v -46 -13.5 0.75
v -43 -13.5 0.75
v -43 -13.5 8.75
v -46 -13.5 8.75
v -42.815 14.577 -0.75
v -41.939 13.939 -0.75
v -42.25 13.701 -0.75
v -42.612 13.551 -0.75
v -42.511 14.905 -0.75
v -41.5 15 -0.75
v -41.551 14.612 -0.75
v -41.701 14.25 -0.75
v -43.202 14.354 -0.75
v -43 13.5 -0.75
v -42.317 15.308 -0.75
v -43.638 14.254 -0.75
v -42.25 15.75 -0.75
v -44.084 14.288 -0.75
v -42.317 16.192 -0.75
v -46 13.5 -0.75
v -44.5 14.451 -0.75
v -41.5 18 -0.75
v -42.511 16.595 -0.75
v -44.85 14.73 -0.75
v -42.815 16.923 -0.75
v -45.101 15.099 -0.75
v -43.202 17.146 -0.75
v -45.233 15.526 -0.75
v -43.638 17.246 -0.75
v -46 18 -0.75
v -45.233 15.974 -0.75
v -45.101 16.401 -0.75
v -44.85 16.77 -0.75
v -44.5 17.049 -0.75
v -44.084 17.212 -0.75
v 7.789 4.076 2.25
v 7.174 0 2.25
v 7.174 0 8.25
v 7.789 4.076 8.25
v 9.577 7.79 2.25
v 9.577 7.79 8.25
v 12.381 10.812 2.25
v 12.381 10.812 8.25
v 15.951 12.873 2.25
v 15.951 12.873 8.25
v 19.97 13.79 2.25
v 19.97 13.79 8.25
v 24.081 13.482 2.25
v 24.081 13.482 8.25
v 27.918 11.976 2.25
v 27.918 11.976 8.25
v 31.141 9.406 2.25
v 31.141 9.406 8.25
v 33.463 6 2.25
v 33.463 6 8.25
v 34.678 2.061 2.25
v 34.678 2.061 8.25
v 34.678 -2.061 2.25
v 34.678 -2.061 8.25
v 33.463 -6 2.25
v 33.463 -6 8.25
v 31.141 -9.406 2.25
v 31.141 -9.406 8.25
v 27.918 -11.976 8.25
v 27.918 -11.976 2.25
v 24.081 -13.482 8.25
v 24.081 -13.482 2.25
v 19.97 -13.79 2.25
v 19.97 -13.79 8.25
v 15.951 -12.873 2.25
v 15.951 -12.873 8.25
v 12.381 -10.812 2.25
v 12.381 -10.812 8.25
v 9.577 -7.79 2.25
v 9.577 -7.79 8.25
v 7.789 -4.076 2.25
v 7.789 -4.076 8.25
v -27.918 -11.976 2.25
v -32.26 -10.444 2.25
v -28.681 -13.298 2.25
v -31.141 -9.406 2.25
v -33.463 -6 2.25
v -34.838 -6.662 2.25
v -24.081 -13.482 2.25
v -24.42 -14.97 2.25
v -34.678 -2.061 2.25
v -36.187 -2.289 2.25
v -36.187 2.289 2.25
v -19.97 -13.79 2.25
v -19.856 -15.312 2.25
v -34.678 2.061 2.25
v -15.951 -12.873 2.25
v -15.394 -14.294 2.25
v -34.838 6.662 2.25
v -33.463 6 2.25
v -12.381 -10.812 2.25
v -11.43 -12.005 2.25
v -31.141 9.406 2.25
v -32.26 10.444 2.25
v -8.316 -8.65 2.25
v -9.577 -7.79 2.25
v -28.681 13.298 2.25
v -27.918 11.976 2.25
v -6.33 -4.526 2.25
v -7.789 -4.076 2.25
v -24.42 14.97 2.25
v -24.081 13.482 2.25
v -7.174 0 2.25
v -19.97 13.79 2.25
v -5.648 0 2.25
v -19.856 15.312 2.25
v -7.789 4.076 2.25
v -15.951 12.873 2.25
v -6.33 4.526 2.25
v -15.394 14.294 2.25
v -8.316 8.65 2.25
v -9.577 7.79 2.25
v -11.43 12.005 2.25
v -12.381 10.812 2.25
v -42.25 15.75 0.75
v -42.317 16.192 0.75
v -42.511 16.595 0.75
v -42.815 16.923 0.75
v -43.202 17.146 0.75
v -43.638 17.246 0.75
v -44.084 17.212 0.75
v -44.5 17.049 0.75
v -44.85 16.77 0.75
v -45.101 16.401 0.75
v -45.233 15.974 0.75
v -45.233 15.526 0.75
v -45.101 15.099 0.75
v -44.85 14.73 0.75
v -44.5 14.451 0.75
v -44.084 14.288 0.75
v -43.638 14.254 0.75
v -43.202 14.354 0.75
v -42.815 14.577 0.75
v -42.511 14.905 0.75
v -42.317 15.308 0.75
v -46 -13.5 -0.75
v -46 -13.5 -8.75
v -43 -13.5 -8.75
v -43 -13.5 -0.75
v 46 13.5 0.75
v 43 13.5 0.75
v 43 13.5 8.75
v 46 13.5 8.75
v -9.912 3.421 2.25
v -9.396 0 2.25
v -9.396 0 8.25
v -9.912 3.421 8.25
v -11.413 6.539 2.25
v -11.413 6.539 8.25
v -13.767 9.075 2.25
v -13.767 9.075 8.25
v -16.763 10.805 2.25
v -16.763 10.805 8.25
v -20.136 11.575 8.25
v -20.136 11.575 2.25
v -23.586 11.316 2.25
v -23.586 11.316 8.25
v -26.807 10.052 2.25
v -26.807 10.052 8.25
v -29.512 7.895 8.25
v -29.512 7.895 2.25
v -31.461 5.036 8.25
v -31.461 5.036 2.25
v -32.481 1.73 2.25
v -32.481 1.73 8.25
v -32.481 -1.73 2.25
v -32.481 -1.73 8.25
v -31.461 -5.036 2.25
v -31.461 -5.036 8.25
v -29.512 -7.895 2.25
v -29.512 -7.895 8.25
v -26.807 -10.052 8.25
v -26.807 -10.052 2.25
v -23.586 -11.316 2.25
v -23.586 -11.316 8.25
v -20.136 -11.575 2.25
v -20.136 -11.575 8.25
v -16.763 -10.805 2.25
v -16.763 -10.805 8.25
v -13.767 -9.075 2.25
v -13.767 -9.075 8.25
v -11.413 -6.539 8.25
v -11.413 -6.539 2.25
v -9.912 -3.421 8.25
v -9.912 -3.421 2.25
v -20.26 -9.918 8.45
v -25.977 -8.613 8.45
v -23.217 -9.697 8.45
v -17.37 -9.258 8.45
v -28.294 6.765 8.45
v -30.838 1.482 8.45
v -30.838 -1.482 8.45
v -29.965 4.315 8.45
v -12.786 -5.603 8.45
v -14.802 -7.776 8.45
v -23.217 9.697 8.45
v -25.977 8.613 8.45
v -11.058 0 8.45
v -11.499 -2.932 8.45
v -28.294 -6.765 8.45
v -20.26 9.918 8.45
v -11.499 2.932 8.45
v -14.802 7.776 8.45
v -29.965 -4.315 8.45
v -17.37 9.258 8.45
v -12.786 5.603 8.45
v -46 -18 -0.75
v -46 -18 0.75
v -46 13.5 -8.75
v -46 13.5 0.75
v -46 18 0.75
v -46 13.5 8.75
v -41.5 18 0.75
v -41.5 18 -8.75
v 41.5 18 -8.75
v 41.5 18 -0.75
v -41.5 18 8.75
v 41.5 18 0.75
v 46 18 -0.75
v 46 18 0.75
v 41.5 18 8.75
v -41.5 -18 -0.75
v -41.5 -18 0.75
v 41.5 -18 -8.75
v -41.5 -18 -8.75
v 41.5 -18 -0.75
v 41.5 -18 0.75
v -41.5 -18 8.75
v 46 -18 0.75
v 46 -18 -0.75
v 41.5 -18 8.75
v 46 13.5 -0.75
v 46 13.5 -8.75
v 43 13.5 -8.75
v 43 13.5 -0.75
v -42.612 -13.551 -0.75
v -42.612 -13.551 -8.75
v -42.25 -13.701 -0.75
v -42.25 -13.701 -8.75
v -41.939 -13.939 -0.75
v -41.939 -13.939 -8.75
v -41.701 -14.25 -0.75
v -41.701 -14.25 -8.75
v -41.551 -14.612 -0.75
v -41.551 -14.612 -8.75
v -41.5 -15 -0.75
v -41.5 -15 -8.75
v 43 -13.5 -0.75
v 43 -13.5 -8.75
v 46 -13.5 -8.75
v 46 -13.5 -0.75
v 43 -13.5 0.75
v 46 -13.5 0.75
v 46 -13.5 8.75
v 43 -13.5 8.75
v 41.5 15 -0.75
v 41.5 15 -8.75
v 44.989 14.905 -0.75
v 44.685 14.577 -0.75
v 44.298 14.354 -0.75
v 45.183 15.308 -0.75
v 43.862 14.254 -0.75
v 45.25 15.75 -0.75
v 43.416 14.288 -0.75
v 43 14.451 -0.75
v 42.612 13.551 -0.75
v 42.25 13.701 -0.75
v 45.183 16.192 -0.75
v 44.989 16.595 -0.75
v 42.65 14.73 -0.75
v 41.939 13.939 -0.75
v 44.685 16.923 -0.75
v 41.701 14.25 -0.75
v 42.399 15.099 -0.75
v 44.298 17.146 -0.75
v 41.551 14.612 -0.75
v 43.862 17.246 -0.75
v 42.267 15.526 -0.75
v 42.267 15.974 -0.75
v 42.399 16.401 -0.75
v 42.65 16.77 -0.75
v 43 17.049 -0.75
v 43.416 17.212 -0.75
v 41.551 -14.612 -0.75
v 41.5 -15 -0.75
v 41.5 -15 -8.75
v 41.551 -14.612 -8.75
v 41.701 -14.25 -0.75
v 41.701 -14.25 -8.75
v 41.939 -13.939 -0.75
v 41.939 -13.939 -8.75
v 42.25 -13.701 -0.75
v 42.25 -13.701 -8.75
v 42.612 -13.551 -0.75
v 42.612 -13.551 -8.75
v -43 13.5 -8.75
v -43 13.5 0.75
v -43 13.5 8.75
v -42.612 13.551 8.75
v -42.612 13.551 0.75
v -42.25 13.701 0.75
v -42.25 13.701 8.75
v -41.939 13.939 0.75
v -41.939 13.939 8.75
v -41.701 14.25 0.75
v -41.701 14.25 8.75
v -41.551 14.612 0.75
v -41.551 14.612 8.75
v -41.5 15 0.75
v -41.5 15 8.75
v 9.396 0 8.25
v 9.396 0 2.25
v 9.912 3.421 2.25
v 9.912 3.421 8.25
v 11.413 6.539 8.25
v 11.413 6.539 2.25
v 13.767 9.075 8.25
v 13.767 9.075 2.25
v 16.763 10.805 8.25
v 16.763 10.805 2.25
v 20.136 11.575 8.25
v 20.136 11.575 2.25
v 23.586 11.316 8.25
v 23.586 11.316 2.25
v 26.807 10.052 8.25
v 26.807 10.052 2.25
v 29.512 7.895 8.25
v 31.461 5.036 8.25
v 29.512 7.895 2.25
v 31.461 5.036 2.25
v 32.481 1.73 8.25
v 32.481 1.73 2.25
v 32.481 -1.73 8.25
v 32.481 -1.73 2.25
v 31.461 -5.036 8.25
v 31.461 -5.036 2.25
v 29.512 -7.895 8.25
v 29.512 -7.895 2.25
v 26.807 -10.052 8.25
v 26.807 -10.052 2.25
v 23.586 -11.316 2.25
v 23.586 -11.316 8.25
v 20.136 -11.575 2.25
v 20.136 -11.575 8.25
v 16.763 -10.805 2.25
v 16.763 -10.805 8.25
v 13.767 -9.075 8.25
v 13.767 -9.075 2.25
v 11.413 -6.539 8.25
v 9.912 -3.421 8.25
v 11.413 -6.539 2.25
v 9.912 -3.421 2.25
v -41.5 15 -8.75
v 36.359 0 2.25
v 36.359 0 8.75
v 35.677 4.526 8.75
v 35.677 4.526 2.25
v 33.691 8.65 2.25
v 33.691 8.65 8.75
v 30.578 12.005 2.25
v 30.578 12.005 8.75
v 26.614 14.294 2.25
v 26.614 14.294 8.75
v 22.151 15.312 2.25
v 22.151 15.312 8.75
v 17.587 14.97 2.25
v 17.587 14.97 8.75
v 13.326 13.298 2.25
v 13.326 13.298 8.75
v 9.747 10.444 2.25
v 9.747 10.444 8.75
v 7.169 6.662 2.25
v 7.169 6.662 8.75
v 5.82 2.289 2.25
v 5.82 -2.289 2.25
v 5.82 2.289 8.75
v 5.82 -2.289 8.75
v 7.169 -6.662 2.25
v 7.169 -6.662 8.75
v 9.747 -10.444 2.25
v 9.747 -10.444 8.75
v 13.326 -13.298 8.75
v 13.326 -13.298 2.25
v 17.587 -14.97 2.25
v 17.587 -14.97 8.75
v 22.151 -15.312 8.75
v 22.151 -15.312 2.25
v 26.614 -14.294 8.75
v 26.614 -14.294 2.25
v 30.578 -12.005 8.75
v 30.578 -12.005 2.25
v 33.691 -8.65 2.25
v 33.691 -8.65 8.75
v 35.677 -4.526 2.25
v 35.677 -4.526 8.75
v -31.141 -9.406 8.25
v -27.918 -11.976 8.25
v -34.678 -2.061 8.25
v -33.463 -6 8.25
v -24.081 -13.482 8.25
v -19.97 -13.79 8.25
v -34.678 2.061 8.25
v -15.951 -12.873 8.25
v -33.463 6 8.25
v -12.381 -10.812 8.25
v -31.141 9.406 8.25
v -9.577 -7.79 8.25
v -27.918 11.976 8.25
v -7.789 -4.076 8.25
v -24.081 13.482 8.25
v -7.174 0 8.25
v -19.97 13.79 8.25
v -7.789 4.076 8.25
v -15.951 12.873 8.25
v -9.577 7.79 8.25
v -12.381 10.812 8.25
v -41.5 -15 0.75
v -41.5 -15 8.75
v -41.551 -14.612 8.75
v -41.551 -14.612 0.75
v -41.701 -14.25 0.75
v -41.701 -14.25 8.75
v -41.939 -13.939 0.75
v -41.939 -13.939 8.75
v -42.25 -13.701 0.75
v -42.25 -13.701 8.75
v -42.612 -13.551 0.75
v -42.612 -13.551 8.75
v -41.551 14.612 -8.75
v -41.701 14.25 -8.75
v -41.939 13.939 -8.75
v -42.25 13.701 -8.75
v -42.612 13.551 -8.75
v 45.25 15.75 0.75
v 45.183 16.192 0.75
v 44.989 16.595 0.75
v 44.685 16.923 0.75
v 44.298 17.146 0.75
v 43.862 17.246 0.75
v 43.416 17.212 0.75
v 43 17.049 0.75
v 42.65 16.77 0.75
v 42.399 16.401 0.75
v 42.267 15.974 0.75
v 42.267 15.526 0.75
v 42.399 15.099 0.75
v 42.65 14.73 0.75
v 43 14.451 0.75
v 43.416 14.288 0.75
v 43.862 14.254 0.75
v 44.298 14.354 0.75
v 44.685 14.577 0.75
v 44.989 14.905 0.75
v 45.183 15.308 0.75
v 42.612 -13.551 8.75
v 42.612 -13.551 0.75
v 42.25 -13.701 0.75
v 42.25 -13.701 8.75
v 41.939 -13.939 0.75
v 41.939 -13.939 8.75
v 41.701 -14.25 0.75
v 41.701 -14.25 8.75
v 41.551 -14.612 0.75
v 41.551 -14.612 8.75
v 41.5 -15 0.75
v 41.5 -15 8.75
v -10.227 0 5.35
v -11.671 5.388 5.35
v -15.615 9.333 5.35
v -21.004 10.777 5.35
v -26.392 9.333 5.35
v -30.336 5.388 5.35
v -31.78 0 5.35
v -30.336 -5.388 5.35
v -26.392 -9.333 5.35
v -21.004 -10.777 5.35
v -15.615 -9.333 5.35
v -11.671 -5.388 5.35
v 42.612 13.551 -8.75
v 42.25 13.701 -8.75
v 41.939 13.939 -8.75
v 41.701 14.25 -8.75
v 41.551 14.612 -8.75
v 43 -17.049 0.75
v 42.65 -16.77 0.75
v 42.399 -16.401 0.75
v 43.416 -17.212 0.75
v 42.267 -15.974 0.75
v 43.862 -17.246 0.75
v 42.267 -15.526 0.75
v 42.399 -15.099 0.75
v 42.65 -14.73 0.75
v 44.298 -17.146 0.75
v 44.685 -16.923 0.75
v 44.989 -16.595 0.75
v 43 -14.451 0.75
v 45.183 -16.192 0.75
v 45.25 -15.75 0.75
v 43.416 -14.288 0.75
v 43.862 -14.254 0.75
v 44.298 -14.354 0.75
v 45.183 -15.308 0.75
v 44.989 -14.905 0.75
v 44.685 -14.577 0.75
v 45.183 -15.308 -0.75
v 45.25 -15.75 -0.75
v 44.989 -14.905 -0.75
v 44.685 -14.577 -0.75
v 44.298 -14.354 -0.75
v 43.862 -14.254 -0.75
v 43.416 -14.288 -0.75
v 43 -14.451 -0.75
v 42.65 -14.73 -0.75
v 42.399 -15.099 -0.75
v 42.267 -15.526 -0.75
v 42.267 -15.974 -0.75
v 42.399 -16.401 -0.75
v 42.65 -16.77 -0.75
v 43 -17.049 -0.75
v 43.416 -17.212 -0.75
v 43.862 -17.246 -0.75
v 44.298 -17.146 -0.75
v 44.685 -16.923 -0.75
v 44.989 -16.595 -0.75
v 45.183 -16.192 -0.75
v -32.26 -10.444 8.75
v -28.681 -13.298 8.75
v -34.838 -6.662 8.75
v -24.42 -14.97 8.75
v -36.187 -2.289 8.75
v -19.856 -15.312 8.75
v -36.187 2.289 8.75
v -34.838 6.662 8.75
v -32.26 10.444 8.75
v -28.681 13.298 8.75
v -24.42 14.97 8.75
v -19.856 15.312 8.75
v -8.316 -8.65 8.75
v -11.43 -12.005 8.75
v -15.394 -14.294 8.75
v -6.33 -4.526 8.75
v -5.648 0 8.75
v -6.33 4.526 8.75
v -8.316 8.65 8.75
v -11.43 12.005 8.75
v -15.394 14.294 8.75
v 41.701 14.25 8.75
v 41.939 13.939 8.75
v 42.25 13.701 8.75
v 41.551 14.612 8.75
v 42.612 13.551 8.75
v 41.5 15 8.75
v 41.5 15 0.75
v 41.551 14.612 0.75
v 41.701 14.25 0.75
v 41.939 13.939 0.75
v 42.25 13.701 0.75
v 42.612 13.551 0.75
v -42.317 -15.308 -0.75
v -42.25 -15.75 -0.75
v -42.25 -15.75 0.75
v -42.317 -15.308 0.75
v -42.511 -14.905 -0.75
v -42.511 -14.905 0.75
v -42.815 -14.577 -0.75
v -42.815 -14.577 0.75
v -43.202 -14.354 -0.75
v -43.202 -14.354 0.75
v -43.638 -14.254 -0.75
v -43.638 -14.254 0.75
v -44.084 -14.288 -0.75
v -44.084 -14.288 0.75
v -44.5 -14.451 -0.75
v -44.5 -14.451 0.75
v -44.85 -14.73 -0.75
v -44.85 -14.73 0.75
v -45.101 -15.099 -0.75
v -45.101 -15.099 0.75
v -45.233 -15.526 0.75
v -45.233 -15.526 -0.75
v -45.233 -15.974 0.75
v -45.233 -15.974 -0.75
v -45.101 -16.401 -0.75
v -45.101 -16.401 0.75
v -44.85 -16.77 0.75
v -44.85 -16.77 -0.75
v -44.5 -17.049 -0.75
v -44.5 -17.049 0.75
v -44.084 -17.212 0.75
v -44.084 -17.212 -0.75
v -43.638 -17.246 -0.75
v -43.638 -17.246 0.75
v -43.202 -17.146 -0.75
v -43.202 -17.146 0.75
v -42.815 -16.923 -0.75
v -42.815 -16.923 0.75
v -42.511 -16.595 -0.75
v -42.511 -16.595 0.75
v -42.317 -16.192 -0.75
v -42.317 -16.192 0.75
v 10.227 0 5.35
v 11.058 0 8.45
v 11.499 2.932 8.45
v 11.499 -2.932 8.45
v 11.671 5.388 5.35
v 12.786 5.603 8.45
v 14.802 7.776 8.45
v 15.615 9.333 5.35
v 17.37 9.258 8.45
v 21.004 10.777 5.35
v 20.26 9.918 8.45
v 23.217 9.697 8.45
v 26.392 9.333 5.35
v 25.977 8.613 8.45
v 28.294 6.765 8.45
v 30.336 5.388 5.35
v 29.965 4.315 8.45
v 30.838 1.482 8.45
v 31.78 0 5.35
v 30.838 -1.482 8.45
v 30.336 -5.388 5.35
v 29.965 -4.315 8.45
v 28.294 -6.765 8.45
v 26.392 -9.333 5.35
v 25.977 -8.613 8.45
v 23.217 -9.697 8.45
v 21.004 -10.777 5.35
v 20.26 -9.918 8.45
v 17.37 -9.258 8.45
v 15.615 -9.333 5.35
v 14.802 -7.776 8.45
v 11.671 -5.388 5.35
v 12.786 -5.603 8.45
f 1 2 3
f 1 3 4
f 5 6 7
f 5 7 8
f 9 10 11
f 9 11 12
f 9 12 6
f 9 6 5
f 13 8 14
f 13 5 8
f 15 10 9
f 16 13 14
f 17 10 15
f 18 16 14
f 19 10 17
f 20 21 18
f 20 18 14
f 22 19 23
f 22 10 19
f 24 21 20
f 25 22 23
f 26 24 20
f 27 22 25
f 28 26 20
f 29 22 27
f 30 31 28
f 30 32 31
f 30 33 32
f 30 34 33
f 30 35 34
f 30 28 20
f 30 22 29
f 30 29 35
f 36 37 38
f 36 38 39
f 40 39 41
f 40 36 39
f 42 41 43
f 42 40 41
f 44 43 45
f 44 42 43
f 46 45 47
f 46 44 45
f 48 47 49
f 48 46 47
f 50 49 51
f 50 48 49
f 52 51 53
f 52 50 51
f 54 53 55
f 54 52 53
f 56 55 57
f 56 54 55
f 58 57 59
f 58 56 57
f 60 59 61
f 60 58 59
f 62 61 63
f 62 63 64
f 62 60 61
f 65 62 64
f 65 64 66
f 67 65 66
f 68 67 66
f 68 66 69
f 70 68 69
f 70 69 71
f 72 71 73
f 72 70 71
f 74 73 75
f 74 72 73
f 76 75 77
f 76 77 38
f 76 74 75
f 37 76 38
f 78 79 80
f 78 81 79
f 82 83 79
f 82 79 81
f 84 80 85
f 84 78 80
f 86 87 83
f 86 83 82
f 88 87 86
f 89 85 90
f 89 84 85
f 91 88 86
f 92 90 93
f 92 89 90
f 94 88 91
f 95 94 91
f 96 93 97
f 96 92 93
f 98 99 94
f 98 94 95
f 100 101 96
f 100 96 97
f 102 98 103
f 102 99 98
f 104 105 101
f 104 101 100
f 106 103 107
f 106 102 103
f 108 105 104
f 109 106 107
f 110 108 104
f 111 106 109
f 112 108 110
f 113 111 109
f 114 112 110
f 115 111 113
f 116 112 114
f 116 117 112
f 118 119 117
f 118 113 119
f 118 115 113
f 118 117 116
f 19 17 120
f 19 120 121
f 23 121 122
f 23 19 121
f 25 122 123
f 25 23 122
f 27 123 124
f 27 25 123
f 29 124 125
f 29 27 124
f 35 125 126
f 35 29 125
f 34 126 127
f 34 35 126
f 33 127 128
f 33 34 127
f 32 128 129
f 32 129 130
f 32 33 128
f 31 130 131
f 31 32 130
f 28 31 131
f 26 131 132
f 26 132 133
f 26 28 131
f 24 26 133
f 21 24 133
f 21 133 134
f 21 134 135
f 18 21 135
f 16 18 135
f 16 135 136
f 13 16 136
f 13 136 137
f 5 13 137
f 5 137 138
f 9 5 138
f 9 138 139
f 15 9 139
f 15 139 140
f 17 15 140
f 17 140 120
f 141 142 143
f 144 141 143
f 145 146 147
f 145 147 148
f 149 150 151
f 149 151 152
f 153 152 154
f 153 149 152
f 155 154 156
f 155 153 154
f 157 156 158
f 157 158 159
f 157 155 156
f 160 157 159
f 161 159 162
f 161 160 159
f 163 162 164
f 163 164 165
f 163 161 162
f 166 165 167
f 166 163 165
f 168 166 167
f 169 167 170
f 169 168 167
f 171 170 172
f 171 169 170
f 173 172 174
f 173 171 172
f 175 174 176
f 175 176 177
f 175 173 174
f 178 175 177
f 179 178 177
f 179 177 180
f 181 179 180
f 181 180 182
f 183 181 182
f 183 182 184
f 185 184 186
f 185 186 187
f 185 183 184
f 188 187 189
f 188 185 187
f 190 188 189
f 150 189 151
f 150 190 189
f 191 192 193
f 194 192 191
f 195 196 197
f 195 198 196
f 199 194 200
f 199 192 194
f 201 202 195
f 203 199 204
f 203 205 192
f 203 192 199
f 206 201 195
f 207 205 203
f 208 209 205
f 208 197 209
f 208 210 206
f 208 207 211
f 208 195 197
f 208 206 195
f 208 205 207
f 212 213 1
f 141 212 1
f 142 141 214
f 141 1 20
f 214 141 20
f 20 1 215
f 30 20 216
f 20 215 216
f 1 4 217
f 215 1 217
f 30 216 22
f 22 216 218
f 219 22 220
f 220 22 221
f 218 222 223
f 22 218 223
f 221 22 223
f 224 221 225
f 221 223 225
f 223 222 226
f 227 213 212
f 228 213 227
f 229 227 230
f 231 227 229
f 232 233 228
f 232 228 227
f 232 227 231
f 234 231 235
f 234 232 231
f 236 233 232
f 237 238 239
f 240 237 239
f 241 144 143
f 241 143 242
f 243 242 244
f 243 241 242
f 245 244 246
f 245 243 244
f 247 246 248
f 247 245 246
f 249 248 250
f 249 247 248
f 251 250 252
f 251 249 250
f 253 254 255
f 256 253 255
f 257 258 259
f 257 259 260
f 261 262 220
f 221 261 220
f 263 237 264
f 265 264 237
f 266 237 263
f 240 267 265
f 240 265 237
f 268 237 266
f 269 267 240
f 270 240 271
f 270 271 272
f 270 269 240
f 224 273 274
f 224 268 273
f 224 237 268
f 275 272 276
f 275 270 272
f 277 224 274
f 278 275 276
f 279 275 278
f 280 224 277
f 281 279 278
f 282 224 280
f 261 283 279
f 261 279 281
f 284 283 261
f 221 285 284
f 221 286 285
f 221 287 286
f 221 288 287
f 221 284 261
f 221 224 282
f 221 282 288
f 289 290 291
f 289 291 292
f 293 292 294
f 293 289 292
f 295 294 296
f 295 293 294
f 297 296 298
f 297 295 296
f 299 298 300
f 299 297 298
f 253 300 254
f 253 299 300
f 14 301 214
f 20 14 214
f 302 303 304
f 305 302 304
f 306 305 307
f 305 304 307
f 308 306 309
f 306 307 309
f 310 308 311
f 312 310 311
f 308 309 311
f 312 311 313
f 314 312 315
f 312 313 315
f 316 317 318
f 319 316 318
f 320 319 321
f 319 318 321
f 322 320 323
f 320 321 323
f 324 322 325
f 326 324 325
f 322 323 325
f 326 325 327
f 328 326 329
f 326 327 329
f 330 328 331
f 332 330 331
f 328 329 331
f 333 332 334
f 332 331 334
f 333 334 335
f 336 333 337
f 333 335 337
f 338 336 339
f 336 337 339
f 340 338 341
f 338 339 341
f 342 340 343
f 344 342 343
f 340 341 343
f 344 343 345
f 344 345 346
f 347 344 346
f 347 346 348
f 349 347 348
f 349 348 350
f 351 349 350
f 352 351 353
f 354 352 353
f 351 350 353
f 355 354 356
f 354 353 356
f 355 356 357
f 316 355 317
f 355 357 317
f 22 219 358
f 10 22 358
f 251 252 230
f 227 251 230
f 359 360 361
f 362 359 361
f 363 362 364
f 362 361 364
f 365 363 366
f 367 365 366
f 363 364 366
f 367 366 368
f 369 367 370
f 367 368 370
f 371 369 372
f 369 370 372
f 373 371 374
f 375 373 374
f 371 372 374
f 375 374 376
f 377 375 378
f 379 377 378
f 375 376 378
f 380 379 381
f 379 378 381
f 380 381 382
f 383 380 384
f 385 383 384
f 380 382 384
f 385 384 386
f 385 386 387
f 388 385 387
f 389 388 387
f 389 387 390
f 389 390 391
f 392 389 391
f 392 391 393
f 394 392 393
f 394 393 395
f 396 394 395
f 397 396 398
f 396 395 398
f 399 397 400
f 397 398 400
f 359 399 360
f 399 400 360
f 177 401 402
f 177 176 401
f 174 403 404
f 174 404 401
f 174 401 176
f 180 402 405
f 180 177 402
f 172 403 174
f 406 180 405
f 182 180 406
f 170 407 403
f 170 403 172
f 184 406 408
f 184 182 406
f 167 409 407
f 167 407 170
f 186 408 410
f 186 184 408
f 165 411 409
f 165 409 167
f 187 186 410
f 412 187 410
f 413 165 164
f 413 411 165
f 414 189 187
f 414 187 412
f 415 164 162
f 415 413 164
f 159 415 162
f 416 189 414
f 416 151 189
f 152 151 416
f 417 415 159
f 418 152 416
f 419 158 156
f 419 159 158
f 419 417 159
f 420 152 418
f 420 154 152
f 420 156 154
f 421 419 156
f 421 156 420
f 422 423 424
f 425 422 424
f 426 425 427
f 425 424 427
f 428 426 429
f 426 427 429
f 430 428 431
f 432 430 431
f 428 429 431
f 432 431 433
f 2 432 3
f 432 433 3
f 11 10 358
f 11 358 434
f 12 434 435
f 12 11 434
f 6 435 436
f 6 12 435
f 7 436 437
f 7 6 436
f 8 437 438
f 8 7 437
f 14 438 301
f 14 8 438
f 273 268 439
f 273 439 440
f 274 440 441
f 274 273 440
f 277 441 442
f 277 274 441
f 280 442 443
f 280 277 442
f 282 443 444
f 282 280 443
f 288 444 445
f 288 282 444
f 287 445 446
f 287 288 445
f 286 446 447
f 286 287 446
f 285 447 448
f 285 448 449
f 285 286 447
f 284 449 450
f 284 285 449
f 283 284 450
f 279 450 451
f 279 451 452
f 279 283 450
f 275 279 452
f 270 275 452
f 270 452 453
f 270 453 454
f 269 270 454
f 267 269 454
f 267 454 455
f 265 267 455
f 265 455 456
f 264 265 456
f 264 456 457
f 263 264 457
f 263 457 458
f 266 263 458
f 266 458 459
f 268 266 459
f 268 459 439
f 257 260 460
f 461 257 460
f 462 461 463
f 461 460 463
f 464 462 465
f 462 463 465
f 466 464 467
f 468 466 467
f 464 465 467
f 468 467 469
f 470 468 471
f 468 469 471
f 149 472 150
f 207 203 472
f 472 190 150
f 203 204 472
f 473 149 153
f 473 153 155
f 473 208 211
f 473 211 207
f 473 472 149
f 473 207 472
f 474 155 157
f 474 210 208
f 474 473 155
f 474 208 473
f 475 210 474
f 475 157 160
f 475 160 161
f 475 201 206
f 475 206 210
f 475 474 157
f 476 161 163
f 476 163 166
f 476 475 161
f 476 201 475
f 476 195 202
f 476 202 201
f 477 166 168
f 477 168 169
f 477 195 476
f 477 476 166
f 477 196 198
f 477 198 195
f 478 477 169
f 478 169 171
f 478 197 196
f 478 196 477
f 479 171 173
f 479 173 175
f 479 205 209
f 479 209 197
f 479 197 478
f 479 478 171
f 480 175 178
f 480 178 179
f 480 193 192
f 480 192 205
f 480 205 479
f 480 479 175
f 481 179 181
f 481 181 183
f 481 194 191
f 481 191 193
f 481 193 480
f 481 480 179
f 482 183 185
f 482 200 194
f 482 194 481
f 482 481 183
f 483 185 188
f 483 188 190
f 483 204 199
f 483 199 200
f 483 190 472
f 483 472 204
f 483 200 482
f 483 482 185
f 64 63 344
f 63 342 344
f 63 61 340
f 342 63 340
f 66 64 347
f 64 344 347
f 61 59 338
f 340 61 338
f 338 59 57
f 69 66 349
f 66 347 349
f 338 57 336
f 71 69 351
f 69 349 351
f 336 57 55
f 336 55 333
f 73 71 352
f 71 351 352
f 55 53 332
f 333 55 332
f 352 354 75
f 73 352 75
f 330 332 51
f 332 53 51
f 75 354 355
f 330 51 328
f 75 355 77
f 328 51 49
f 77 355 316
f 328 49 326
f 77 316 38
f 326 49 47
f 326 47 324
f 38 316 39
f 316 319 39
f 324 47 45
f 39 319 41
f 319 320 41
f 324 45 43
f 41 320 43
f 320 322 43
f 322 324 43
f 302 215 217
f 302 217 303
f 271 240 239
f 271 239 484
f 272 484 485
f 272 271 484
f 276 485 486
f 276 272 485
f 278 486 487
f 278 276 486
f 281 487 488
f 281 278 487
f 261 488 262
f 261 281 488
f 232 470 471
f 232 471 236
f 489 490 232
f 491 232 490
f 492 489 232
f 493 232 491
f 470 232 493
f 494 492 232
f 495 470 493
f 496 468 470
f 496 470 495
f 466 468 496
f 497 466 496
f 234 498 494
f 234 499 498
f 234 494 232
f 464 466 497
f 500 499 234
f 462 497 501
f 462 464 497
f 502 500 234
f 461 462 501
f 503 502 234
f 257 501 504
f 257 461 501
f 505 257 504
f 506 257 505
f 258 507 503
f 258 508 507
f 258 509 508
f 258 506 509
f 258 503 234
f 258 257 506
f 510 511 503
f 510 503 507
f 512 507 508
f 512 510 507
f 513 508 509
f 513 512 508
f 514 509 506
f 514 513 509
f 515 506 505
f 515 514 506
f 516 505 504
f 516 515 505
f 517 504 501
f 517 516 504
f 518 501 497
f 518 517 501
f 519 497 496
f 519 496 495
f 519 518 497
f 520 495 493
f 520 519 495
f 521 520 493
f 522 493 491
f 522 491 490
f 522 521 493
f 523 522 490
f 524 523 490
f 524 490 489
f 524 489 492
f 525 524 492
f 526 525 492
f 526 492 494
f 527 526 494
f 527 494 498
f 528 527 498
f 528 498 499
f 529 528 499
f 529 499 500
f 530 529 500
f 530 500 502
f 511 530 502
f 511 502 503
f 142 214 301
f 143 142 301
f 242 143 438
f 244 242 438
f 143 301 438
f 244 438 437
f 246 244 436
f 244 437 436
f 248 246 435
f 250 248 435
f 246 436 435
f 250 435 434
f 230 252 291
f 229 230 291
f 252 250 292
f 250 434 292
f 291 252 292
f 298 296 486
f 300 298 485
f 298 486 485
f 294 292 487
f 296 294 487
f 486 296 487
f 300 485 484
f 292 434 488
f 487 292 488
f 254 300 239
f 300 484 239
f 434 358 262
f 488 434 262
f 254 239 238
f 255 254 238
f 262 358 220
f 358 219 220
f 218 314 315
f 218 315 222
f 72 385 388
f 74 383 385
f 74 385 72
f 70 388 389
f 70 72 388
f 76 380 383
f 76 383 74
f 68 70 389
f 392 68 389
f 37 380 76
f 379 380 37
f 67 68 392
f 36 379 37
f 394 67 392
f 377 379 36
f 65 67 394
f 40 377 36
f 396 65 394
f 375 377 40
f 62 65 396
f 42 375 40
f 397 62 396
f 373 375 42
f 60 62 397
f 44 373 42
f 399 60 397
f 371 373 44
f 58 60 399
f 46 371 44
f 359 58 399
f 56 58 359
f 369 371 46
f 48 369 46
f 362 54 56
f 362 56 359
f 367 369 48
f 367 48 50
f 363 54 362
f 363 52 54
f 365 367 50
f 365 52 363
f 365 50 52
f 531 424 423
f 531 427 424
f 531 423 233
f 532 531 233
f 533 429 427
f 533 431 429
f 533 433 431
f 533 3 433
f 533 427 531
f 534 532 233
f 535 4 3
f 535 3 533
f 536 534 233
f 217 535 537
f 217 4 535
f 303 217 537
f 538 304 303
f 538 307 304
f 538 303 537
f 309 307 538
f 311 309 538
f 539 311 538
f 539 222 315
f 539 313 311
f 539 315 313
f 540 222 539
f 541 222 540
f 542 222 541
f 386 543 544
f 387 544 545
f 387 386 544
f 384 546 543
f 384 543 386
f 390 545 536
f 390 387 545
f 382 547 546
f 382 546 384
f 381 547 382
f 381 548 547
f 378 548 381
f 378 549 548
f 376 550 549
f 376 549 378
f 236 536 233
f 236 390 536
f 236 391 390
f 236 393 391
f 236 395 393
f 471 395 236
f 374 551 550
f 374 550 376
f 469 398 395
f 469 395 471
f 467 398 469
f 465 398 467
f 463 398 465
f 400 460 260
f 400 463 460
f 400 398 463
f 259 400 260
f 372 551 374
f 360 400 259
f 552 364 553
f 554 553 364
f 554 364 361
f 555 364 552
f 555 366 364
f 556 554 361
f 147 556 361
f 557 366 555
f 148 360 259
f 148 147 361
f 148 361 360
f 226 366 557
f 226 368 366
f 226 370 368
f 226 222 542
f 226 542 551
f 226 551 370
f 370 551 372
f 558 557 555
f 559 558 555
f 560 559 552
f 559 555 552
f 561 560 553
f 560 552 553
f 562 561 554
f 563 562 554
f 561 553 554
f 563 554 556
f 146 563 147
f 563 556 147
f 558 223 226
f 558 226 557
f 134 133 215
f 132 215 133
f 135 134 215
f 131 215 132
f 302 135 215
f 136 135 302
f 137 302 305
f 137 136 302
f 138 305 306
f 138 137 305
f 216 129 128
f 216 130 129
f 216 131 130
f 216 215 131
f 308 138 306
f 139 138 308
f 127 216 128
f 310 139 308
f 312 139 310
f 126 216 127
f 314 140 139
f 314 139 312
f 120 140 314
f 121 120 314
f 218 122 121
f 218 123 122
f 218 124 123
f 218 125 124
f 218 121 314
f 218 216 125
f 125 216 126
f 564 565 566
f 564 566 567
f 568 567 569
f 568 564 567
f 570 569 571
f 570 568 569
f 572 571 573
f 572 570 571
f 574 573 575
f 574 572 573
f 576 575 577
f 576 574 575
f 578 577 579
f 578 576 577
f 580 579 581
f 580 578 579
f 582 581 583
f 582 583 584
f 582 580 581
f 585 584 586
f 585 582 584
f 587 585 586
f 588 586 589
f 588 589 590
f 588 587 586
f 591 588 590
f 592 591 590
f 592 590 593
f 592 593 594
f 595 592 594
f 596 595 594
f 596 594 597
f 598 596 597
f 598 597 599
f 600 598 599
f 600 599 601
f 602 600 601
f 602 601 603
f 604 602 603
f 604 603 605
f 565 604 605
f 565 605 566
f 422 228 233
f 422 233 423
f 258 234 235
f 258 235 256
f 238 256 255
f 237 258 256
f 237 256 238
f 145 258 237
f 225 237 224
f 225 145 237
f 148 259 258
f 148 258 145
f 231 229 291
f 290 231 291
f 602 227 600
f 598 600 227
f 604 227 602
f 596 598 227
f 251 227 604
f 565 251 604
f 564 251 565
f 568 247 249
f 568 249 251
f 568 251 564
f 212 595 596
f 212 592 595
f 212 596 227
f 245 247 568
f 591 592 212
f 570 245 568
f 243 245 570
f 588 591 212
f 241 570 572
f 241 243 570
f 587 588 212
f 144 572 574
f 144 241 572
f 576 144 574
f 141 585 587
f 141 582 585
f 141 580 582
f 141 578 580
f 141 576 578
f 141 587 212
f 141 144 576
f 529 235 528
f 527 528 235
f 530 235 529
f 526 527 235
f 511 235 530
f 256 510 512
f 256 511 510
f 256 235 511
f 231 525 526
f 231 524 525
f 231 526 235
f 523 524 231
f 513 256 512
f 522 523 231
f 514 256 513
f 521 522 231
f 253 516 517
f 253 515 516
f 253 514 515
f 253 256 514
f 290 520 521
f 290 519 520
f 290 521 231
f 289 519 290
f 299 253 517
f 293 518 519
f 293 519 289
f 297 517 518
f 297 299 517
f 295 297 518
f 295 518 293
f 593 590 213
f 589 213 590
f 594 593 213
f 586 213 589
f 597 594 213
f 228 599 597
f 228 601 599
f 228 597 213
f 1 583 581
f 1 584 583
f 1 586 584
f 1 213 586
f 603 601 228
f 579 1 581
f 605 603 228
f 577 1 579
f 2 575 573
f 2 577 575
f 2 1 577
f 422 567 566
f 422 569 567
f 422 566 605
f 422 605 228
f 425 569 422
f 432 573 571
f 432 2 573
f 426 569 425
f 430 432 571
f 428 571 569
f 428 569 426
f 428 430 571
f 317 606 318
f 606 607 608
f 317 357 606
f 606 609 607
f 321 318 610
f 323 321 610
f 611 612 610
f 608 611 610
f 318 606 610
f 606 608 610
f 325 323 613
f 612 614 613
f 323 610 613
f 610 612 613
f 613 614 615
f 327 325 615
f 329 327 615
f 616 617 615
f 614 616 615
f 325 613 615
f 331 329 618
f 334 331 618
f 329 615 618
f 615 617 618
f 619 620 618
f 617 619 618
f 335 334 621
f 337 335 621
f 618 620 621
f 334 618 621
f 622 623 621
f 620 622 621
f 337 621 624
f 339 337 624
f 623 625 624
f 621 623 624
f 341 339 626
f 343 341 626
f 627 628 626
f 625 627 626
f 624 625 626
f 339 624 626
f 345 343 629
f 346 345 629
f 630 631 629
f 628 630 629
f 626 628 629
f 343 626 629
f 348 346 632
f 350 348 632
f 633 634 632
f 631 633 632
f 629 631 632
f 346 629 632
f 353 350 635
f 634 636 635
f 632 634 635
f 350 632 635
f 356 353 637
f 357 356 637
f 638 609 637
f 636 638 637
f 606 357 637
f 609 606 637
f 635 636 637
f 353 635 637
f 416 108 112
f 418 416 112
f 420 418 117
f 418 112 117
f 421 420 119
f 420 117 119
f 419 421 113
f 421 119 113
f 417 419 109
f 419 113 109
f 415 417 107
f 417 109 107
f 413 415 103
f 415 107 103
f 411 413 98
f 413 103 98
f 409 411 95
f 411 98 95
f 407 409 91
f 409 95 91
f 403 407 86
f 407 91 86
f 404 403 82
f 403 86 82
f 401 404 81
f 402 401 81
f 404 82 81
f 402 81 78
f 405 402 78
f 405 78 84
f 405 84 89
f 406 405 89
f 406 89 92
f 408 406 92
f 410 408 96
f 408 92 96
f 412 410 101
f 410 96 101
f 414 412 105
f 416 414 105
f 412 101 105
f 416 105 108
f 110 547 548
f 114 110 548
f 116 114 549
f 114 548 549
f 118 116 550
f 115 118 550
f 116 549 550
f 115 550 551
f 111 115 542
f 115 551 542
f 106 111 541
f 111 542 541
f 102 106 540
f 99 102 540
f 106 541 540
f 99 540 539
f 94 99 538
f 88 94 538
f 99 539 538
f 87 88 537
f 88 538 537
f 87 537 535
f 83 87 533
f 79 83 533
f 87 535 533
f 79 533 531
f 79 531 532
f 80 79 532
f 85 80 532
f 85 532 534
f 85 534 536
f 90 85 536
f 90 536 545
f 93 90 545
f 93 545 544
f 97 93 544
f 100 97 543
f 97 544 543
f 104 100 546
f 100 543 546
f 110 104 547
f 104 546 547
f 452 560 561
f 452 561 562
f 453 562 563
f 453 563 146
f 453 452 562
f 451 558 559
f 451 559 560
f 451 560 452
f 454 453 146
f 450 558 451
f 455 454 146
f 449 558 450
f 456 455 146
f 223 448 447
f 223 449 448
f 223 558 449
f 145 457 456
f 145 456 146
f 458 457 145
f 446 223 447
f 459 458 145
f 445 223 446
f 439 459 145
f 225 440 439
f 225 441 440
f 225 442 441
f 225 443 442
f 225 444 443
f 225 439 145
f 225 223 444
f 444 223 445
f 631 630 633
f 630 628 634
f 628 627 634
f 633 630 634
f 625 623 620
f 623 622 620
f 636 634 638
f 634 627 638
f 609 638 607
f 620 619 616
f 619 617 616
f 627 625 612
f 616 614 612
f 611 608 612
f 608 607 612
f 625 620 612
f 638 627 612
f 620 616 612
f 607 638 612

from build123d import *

# Parameters (mm, degrees)
SKETCH1_W               = 92
SKETCH1_H               = 36
BOSS_EXTRUDE1_DEPTH     = 8.75
CUT_EXTRUDE1_DEPTH      = 53.404675364
CUT_EXTRUDE1_DEPTH_BACK = 53.404675364
SKETCH2_R               = 1.5
SKETCH3_R               = 1.5
CUT_EXTRUDE2_DEPTH      = 8
CUT_EXTRUDE3_START      = -8
SKETCH4_R               = 1.5
CUT_EXTRUDE3_DEPTH      = 8
SKETCH5_R               = 15.355410725
CUT_EXTRUDE4_DEPTH      = 6.5
SKETCH6_R               = 13.829083231
SKETCH6_R_2             = 11.607285571
BOSS_EXTRUDE2_DEPTH     = 6
SKETCH7_R               = 11.607285571
BOSS_EXTRUDE3_DEPTH     = 6.2
BOSS_EXTRUDE3_TAPER     = 15


with BuildPart() as part:
    # Sketch1 → Boss-Extrude1 (new, symmetric)
    with BuildSketch(Plane.XY):
        Rectangle(SKETCH1_W, SKETCH1_H)
    extrude(amount=BOSS_EXTRUDE1_DEPTH, both=True)

    # Sketch2 → Cut-Extrude1 (cut, two sides: drawn at the far end of the back side and taken through both)
    with BuildSketch(Plane.XY.offset(8.75).offset(-CUT_EXTRUDE1_DEPTH_BACK)):
        with Locations((43.75, 15.75)):
            Circle(SKETCH2_R)
        with Locations((43.75, -15.75)):
            Circle(SKETCH2_R)
        with Locations((-43.75, -15.75)):
            Circle(SKETCH2_R)
        with Locations((-43.75, 15.75)):
            Circle(SKETCH2_R)
    extrude(amount=CUT_EXTRUDE1_DEPTH + CUT_EXTRUDE1_DEPTH_BACK, mode=Mode.SUBTRACT)

    # Sketch3 → Cut-Extrude2 (cut)
    # profile 1 of 4: a face of its own
    with BuildSketch(Plane.XY.offset(8.75)):
        with BuildLine():
            Line((-41.5, 18), (-46, 18))
            Line((-46, 18), (-46, 13.5))
            Line((-46, 13.5), (-43, 13.5))
            ThreePointArc((-43, 13.5), (-41.939339828, 13.939339828), (-41.5, 15))
            Line((-41.5, 15), (-41.5, 18))
        make_face()
        with Locations((-43.75, 15.75)):
            Circle(SKETCH3_R, mode=Mode.SUBTRACT)
    # profile 2 of 4: a face of its own
    with BuildSketch(Plane.XY.offset(8.75)):
        with BuildLine():
            Line((41.5, 18), (41.5, 15))
            ThreePointArc((41.5, 15), (41.939339828, 13.939339828), (43, 13.5))
            Line((43, 13.5), (46, 13.5))
            Line((46, 13.5), (46, 18))
            Line((46, 18), (41.5, 18))
        make_face()
        with Locations((43.75, 15.75)):
            Circle(SKETCH3_R, mode=Mode.SUBTRACT)
    # profile 3 of 4: a face of its own
    with BuildSketch(Plane.XY.offset(8.75)):
        with BuildLine():
            Line((-41.5, -18), (-41.5, -15))
            ThreePointArc((-41.5, -15), (-41.939339828, -13.939339828), (-43, -13.5))
            Line((-43, -13.5), (-46, -13.5))
            Line((-46, -13.5), (-46, -18))
            Line((-46, -18), (-41.5, -18))
        make_face()
        with Locations((-43.75, -15.75)):
            Circle(SKETCH3_R, mode=Mode.SUBTRACT)
    # profile 4 of 4: a face of its own
    with BuildSketch(Plane.XY.offset(8.75)):
        with BuildLine():
            Line((41.5, -18), (46, -18))
            Line((46, -18), (46, -13.5))
            Line((46, -13.5), (43, -13.5))
            ThreePointArc((43, -13.5), (41.939339828, -13.939339828), (41.5, -15))
            Line((41.5, -15), (41.5, -18))
        make_face()
        with Locations((43.75, -15.75)):
            Circle(SKETCH3_R, mode=Mode.SUBTRACT)
    extrude(amount=-CUT_EXTRUDE2_DEPTH, mode=Mode.SUBTRACT)

    # Sketch4 → Cut-Extrude3 (cut)
    # profile 1 of 4: a face of its own
    with BuildSketch(Plane(origin=(0, 0, -8.75), x_dir=(-1, 0, 0), z_dir=(0, 0, -1)).offset(CUT_EXTRUDE3_START)):
        with BuildLine():
            Line((46, 18), (41.5, 18))
            Line((41.5, 18), (41.5, 15))
            ThreePointArc((41.5, 15), (41.939339828, 13.939339828), (43, 13.5))
            Line((43, 13.5), (46, 13.5))
            Line((46, 13.5), (46, 18))
        make_face()
        with Locations(Location((43.75, 15.75, 0), (0, 0, 180))):
            Circle(SKETCH4_R, mode=Mode.SUBTRACT)
    # profile 2 of 4: a face of its own
    with BuildSketch(Plane(origin=(0, 0, -8.75), x_dir=(-1, 0, 0), z_dir=(0, 0, -1)).offset(CUT_EXTRUDE3_START)):
        with BuildLine():
            Line((-41.5, 15), (-41.5, 18))
            Line((-41.5, 18), (-46, 18))
            Line((-46, 18), (-46, 13.5))
            Line((-46, 13.5), (-43, 13.5))
            ThreePointArc((-43, 13.5), (-41.939339828, 13.939339828), (-41.5, 15))
        make_face()
        with Locations(Location((-43.75, 15.75, 0), (0, 0, 180))):
            Circle(SKETCH4_R, mode=Mode.SUBTRACT)
    # profile 3 of 4: a face of its own
    with BuildSketch(Plane(origin=(0, 0, -8.75), x_dir=(-1, 0, 0), z_dir=(0, 0, -1)).offset(CUT_EXTRUDE3_START)):
        with BuildLine():
            Line((41.5, -15), (41.5, -18))
            Line((41.5, -18), (46, -18))
            Line((46, -18), (46, -13.5))
            Line((46, -13.5), (43, -13.5))
            ThreePointArc((43, -13.5), (41.939339828, -13.939339828), (41.5, -15))
        make_face()
        with Locations(Location((43.75, -15.75, 0), (0, 0, 180))):
            Circle(SKETCH4_R, mode=Mode.SUBTRACT)
    # profile 4 of 4: a face of its own
    with BuildSketch(Plane(origin=(0, 0, -8.75), x_dir=(-1, 0, 0), z_dir=(0, 0, -1)).offset(CUT_EXTRUDE3_START)):
        with BuildLine():
            Line((-46, -18), (-41.5, -18))
            Line((-41.5, -18), (-41.5, -15))
            ThreePointArc((-41.5, -15), (-41.939339828, -13.939339828), (-43, -13.5))
            Line((-43, -13.5), (-46, -13.5))
            Line((-46, -13.5), (-46, -18))
        make_face()
        with Locations(Location((-43.75, -15.75, 0), (0, 0, 180))):
            Circle(SKETCH4_R, mode=Mode.SUBTRACT)
    extrude(amount=CUT_EXTRUDE3_DEPTH, mode=Mode.SUBTRACT)

    # Sketch5 → Cut-Extrude4 (cut)
    with BuildSketch(Plane.XY.offset(8.75)):
        with Locations((-21.003558343, 0)):
            Circle(SKETCH5_R)
        with Locations((21.003558343, 0)):
            Circle(SKETCH5_R)
    extrude(amount=-CUT_EXTRUDE4_DEPTH, mode=Mode.SUBTRACT)

    # Sketch6 → Boss-Extrude2 (add)
    with BuildSketch(Plane.XY.offset(2.25)):
        with Locations((-21.003558343, 0)):
            Circle(SKETCH6_R)
        with Locations((-21.003558343, 0)):
            Circle(SKETCH6_R_2, mode=Mode.SUBTRACT)
    boss_extrude2 = extrude(amount=BOSS_EXTRUDE2_DEPTH)

    # Sketch7 → Boss-Extrude3 (add)
    with BuildSketch(Plane.XY.offset(2.25)):
        with Locations((-21.003558343, 0)):
            Circle(SKETCH7_R)
    boss_extrude3 = extrude(amount=BOSS_EXTRUDE3_DEPTH, taper=BOSS_EXTRUDE3_TAPER)

    # Mirror2: Boss-Extrude2, Boss-Extrude3 across plane
    add(boss_extrude2.mirror(Plane(origin=(0, 0, 0), x_dir=(0, 0, 1), z_dir=(1, 0, 0))))
    add(boss_extrude3.mirror(Plane(origin=(0, 0, 0), x_dir=(0, 0, 1), z_dir=(1, 0, 0))))


solid = part.part
